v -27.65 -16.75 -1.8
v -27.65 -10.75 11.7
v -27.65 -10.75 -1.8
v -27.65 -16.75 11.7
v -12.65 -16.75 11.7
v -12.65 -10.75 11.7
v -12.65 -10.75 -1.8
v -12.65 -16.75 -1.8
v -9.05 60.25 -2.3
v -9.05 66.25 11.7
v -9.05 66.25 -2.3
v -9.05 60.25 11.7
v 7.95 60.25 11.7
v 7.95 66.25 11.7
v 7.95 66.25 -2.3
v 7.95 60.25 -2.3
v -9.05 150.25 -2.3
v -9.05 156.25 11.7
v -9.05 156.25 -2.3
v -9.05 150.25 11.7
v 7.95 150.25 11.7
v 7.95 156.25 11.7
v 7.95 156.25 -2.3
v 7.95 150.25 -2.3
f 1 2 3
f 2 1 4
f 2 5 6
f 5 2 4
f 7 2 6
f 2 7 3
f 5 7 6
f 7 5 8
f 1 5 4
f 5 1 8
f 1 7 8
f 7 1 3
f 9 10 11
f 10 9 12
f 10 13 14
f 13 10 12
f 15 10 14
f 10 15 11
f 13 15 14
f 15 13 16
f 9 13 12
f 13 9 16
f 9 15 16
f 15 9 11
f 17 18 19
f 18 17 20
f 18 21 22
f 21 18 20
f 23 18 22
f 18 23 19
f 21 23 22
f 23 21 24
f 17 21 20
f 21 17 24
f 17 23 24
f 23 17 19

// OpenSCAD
// file: PiDimensions.scad
// Dimensions for raspberry Pis

hole_offset = 3.5;
e = 0.001;

// gap between board and walls (y)
gap = 0.4;

outer_radius = 7;
inner_radius = 1;

// thickness of sides
top_thick = 1.2;
side_thick = 1.2;
hat_height = 17;
sweep_height = 10;

standoff_height = 7;
standoff_radius = 3;

corner_support_radius = 5.5;
corner_support_hole = 3;
corner_space_left = 2 * corner_support_radius;


pin_height = 2;

pin_radius = 1.1;


thickness = 1.2; // mm for board

split = top_thick
    +standoff_height
    +thickness
    +8;


// width
// depth

NAME=0;
WIDTH=1;
DEPTH=2;
HEIGHT=3;
HATS=9;
SPACE_LEFT = 10;
SPACE_RIGHT = 11;

// https://www.raspberrypi.org/documentation/hardware/raspberrypi/mechanical/rpi_MECH_3aplus.pdf

function params_pi3A() = [
  "Pi3A",
  65+.10, /* width */
  56+.10, /* depth */
  12,     /* height of highest point */
  10.6,   /* center of USB for power */
  10.6,   /* center of second USB (if none use same) */
  32.0,   /* hdmi offset */
  17.0,   /* hdmi width */
   8.0,   /* hdmi height */
   1.0,   /* hats */
   6.0,   /* space left */
   6.0,   /* space right */
];

function params_pi3B() = [
  "Pi3B",
  65+.10, /* width */
  56+.10, /* depth */
  12.0,   /* height of highest point */
  10.6,   /* center of USB for power */
  10.6,   /* center of second USB (if none use same) */
  32.0,   /* hdmi offset */
  17.0,   /* hdmi width */
   8.0,   /* hdmi height */
   1.0,   /* hats */
   6.0,   /* space left */
   16.0,  /* space right */
];

function params_piW() = [
  "PiW",
  65+.10, /* width */
  30+.10, /* depth */
  12.0,     /* height of highest point */
  54,     /* center of USB for power */
  41.4,   /* center of second USB (if none use same) */
  12.4,   /* hdmi offset */
  15.0,   /* hdmi width */
   7.0,   /* hdmi height */
   1.0,   /* hats */
   6.0,   /* space left */
   6.0,   /* space right */
];

function examples() = [
  [0, params_piW(), "red"],
  [90, params_pi3A(), "green"],
  [180, params_pi3B(), "blue"]
];

// use in a loop
//for (ex = examples())
//    translate([0,ex[0],0])
//    usb_plus(ex[1]);


// Sweeps a connector up to clear a path for it
module sweep(h=0)
{
   hull()
   {
       children();
       translate([0,0,sweep_height-h])
       children();
   }
}
// main file
// HDMI

// HDMI Connections on Raspberry Pi
include <PiDimensions.scad>;

module hdmi(params)
{
    width = params[1];
    depth = params[2];
    height = params[3];
    hdmi_offset = params[6];
    hdmi_width = params[7];
    hdmi_height = params[8];

   translate([-width/2 + hdmi_offset,
   -side_thick-depth/2+2.5,
   thickness+0.5])
   sweep(hdmi_height/2)
   cube([hdmi_width,6,hdmi_height], center=true);

// pi_w has micro HDMI
//if pi_w then
//
//hdmi_plug = translate(-width/2+hdmi_offset,
//   -side_thick-depth/2,
//   top_thick+standoff_height+board_thickness+0.2) * cube(hdmi_width*2/3,side_thick,hdmi_height/2)
//end
}


for (ex = examples())
    translate([0,ex[0],0])
    hdmi(ex[1]);
